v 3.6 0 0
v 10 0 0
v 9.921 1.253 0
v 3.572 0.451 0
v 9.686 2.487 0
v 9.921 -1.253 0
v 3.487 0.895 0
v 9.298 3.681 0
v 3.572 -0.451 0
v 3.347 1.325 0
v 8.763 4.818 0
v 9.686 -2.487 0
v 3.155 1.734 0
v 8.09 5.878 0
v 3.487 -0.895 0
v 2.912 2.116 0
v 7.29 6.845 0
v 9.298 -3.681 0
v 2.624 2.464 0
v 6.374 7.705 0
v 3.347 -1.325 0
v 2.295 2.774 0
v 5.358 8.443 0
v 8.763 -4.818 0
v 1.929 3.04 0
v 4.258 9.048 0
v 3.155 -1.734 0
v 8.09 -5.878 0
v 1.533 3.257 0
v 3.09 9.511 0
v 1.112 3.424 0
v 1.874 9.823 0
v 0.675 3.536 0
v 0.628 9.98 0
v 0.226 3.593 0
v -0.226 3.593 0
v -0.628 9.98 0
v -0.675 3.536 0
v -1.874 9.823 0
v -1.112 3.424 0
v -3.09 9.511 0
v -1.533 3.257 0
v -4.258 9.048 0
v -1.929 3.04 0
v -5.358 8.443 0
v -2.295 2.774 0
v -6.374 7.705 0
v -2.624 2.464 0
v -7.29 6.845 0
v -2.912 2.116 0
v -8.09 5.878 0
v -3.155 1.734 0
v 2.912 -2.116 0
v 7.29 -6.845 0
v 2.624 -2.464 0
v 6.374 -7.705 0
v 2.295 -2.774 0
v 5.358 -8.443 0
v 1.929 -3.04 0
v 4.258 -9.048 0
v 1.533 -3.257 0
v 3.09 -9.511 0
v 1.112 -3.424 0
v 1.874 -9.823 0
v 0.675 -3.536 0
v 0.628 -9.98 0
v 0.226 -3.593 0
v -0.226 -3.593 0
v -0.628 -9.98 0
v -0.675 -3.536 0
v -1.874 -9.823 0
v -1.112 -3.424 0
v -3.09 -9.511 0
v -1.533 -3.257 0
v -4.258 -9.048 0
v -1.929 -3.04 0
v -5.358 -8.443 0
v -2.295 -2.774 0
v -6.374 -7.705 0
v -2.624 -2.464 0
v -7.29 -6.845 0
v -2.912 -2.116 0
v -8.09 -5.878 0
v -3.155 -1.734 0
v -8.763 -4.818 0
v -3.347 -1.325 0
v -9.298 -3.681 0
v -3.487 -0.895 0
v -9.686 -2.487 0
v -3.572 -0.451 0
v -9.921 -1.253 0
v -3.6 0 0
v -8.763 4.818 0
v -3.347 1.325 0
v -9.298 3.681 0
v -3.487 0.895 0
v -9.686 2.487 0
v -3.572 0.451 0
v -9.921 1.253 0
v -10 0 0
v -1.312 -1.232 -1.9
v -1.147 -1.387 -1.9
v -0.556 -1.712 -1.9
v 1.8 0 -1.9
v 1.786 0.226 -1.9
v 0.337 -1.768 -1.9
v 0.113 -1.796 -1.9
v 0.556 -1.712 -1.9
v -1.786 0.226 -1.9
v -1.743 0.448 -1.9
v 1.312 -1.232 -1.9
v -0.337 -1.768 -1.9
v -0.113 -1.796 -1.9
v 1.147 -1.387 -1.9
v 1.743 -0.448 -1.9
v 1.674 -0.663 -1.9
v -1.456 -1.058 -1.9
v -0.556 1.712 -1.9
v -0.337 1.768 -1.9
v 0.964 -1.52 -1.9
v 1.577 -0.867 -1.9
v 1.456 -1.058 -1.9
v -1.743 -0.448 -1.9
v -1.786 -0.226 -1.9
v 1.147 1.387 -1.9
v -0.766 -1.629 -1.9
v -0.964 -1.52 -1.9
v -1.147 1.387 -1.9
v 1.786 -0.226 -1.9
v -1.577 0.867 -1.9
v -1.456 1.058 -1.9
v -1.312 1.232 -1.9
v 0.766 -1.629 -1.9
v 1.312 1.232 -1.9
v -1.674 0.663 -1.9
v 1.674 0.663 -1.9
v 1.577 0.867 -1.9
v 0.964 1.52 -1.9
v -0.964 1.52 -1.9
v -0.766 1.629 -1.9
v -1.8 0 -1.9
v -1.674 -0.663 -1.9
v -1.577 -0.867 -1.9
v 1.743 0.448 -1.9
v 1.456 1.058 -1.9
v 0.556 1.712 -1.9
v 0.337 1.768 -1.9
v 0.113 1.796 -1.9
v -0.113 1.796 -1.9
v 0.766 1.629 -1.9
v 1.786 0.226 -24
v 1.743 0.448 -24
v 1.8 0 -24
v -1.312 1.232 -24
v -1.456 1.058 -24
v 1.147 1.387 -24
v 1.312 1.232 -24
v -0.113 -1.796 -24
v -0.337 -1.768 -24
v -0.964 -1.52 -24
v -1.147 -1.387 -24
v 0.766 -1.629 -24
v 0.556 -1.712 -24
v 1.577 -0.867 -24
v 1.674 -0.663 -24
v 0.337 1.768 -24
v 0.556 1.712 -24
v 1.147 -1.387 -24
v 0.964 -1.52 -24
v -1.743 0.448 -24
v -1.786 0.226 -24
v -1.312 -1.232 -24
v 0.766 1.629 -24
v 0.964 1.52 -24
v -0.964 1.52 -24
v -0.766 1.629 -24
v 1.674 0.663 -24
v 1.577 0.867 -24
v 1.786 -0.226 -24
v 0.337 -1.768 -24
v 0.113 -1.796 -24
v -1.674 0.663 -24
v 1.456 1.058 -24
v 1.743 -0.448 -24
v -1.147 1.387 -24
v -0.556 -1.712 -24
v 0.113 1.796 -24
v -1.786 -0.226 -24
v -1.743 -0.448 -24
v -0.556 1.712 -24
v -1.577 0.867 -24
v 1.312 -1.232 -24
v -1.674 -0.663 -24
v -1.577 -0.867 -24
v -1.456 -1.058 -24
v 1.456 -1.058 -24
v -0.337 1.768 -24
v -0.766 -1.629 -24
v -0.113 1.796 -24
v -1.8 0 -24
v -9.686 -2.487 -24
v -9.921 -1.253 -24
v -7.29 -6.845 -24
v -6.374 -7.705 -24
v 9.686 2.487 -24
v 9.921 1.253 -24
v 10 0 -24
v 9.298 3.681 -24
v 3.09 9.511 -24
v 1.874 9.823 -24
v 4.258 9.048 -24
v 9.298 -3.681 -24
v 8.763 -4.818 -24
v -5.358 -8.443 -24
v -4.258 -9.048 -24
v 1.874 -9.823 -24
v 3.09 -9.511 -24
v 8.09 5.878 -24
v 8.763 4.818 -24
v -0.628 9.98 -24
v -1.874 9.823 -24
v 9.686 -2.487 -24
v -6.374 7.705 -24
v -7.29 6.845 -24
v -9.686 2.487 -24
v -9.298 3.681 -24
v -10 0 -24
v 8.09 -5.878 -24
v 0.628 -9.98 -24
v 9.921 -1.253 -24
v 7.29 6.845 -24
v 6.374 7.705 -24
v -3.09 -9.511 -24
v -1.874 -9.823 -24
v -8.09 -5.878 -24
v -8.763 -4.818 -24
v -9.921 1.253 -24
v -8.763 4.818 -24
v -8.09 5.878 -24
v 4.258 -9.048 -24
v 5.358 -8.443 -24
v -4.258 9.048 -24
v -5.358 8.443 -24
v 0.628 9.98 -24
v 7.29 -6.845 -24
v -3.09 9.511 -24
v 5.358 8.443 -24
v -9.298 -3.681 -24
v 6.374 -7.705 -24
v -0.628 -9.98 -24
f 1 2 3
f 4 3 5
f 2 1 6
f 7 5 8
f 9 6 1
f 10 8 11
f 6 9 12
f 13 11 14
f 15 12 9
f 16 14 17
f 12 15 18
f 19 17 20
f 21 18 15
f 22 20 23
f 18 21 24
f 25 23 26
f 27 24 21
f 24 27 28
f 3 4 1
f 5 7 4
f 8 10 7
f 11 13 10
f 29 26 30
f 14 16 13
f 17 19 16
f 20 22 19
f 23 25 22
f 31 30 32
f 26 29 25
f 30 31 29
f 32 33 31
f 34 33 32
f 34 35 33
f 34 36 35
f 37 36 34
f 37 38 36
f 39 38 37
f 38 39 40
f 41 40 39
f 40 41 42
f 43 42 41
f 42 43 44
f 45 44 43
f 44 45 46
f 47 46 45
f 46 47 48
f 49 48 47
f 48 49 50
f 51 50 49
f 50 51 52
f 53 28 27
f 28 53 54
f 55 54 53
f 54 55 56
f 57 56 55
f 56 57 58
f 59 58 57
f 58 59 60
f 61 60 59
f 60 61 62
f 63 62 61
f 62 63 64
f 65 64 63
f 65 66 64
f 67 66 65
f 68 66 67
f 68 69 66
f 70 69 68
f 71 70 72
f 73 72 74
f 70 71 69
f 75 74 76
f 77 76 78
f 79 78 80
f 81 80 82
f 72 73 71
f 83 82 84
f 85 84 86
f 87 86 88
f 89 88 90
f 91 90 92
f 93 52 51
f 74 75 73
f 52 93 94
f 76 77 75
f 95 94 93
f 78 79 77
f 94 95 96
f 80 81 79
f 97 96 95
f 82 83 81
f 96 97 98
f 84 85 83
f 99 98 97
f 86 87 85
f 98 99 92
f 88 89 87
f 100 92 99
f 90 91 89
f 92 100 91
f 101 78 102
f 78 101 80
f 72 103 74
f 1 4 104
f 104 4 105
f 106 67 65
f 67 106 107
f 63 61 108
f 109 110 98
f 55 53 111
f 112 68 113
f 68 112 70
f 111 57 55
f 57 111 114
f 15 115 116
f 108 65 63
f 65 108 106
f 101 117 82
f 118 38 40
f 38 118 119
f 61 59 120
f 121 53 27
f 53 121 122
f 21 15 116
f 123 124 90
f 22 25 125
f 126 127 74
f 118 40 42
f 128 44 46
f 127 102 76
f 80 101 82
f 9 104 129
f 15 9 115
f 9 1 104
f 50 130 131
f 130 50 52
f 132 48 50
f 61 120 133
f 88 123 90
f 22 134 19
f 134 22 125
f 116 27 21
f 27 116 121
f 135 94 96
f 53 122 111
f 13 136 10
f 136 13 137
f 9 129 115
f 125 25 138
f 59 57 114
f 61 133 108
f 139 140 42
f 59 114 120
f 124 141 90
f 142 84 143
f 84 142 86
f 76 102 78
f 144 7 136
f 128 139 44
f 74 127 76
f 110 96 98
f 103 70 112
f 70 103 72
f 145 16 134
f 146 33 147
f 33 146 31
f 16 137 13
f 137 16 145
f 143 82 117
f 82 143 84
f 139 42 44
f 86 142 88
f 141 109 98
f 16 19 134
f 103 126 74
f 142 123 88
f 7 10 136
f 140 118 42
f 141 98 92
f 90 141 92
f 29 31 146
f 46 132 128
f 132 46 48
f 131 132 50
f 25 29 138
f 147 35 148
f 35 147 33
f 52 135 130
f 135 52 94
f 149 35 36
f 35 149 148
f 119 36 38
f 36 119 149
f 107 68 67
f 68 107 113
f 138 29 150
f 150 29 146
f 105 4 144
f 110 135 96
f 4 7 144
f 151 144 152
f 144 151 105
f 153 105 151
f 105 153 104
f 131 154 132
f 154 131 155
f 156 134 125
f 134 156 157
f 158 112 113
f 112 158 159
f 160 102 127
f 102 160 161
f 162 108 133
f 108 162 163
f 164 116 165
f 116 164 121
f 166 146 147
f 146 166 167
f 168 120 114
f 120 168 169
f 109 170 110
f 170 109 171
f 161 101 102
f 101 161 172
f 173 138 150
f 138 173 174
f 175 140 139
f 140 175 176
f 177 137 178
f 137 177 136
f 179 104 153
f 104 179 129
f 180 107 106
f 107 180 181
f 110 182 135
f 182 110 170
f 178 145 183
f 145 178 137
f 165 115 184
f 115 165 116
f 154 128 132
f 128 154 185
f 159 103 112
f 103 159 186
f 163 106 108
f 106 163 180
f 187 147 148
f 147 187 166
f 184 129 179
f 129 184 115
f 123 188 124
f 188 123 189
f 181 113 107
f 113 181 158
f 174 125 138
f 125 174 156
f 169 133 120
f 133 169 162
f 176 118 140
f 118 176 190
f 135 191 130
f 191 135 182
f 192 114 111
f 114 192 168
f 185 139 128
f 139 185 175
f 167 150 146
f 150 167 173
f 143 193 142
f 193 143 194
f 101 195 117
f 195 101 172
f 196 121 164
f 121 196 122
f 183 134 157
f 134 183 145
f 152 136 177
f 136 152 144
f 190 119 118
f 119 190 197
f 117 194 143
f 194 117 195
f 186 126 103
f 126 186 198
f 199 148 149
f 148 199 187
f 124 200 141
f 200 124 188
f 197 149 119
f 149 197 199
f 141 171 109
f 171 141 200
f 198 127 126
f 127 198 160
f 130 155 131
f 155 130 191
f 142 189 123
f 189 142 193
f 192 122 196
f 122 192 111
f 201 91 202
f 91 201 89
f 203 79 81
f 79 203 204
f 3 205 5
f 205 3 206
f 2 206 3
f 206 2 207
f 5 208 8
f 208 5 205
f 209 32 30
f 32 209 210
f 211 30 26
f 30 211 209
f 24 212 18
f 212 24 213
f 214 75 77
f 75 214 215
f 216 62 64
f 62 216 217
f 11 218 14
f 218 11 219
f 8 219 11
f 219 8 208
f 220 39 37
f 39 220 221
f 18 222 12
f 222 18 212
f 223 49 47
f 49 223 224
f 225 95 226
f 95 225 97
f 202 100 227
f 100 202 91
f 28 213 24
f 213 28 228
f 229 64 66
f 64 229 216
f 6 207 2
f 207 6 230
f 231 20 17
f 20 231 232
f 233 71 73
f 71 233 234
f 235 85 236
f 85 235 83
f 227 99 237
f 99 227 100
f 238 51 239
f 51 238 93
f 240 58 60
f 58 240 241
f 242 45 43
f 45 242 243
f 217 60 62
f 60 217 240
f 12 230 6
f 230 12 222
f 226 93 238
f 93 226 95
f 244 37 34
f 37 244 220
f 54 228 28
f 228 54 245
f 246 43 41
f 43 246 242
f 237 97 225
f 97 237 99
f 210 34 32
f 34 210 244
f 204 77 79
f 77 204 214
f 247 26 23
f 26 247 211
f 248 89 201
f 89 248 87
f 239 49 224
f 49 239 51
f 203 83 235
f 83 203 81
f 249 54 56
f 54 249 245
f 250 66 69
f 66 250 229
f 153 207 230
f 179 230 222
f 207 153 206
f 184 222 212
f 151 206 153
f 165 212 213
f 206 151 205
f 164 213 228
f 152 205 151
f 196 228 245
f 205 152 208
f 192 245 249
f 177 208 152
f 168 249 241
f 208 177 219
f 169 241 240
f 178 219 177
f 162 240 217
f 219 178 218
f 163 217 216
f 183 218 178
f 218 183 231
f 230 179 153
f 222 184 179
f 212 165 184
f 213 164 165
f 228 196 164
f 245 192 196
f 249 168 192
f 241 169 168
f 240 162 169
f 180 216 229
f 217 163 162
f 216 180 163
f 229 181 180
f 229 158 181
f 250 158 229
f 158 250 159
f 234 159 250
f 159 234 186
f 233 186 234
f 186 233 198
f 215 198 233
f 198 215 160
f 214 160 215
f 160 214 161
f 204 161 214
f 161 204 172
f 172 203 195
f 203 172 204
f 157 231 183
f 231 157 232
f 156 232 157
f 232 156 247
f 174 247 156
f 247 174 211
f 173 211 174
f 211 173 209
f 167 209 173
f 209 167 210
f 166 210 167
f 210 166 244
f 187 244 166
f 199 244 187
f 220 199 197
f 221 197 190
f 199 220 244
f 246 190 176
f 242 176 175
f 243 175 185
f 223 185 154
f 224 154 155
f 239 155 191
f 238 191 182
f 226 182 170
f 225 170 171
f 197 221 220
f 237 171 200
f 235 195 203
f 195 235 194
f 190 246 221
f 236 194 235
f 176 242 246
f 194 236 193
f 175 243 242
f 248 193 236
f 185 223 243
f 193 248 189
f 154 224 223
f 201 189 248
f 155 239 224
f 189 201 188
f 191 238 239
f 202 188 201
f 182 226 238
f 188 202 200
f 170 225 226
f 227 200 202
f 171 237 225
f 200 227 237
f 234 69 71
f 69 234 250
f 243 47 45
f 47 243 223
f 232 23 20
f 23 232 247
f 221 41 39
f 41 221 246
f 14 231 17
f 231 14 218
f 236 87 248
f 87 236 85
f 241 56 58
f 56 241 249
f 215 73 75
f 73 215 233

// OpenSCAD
$fn = 50;

difference() {
	union() {
		translate(v = [0, 0, -24.0]) {
			cylinder(h = 24, r = 10.0);
		}
	}
	union() {
		translate(v = [0, 0, 0]) {
			rotate(a = [0, 0, 0]) {
				difference() {
					union() {
						translate(v = [0, 0, -27.0]) {
							cylinder(h = 27, r = 1.5);
						}
						translate(v = [0, 0, -1.9]) {
							cylinder(h = 1.9, r1 = 1.8, r2 = 3.6);
						}
						translate(v = [0, 0, -27.0]) {
							cylinder(h = 27, r = 1.8);
						}
						translate(v = [0, 0, -27.0]) {
							cylinder(h = 27, r = 1.5);
						}
					}
					union();
				}
			}
		}
	}
}
